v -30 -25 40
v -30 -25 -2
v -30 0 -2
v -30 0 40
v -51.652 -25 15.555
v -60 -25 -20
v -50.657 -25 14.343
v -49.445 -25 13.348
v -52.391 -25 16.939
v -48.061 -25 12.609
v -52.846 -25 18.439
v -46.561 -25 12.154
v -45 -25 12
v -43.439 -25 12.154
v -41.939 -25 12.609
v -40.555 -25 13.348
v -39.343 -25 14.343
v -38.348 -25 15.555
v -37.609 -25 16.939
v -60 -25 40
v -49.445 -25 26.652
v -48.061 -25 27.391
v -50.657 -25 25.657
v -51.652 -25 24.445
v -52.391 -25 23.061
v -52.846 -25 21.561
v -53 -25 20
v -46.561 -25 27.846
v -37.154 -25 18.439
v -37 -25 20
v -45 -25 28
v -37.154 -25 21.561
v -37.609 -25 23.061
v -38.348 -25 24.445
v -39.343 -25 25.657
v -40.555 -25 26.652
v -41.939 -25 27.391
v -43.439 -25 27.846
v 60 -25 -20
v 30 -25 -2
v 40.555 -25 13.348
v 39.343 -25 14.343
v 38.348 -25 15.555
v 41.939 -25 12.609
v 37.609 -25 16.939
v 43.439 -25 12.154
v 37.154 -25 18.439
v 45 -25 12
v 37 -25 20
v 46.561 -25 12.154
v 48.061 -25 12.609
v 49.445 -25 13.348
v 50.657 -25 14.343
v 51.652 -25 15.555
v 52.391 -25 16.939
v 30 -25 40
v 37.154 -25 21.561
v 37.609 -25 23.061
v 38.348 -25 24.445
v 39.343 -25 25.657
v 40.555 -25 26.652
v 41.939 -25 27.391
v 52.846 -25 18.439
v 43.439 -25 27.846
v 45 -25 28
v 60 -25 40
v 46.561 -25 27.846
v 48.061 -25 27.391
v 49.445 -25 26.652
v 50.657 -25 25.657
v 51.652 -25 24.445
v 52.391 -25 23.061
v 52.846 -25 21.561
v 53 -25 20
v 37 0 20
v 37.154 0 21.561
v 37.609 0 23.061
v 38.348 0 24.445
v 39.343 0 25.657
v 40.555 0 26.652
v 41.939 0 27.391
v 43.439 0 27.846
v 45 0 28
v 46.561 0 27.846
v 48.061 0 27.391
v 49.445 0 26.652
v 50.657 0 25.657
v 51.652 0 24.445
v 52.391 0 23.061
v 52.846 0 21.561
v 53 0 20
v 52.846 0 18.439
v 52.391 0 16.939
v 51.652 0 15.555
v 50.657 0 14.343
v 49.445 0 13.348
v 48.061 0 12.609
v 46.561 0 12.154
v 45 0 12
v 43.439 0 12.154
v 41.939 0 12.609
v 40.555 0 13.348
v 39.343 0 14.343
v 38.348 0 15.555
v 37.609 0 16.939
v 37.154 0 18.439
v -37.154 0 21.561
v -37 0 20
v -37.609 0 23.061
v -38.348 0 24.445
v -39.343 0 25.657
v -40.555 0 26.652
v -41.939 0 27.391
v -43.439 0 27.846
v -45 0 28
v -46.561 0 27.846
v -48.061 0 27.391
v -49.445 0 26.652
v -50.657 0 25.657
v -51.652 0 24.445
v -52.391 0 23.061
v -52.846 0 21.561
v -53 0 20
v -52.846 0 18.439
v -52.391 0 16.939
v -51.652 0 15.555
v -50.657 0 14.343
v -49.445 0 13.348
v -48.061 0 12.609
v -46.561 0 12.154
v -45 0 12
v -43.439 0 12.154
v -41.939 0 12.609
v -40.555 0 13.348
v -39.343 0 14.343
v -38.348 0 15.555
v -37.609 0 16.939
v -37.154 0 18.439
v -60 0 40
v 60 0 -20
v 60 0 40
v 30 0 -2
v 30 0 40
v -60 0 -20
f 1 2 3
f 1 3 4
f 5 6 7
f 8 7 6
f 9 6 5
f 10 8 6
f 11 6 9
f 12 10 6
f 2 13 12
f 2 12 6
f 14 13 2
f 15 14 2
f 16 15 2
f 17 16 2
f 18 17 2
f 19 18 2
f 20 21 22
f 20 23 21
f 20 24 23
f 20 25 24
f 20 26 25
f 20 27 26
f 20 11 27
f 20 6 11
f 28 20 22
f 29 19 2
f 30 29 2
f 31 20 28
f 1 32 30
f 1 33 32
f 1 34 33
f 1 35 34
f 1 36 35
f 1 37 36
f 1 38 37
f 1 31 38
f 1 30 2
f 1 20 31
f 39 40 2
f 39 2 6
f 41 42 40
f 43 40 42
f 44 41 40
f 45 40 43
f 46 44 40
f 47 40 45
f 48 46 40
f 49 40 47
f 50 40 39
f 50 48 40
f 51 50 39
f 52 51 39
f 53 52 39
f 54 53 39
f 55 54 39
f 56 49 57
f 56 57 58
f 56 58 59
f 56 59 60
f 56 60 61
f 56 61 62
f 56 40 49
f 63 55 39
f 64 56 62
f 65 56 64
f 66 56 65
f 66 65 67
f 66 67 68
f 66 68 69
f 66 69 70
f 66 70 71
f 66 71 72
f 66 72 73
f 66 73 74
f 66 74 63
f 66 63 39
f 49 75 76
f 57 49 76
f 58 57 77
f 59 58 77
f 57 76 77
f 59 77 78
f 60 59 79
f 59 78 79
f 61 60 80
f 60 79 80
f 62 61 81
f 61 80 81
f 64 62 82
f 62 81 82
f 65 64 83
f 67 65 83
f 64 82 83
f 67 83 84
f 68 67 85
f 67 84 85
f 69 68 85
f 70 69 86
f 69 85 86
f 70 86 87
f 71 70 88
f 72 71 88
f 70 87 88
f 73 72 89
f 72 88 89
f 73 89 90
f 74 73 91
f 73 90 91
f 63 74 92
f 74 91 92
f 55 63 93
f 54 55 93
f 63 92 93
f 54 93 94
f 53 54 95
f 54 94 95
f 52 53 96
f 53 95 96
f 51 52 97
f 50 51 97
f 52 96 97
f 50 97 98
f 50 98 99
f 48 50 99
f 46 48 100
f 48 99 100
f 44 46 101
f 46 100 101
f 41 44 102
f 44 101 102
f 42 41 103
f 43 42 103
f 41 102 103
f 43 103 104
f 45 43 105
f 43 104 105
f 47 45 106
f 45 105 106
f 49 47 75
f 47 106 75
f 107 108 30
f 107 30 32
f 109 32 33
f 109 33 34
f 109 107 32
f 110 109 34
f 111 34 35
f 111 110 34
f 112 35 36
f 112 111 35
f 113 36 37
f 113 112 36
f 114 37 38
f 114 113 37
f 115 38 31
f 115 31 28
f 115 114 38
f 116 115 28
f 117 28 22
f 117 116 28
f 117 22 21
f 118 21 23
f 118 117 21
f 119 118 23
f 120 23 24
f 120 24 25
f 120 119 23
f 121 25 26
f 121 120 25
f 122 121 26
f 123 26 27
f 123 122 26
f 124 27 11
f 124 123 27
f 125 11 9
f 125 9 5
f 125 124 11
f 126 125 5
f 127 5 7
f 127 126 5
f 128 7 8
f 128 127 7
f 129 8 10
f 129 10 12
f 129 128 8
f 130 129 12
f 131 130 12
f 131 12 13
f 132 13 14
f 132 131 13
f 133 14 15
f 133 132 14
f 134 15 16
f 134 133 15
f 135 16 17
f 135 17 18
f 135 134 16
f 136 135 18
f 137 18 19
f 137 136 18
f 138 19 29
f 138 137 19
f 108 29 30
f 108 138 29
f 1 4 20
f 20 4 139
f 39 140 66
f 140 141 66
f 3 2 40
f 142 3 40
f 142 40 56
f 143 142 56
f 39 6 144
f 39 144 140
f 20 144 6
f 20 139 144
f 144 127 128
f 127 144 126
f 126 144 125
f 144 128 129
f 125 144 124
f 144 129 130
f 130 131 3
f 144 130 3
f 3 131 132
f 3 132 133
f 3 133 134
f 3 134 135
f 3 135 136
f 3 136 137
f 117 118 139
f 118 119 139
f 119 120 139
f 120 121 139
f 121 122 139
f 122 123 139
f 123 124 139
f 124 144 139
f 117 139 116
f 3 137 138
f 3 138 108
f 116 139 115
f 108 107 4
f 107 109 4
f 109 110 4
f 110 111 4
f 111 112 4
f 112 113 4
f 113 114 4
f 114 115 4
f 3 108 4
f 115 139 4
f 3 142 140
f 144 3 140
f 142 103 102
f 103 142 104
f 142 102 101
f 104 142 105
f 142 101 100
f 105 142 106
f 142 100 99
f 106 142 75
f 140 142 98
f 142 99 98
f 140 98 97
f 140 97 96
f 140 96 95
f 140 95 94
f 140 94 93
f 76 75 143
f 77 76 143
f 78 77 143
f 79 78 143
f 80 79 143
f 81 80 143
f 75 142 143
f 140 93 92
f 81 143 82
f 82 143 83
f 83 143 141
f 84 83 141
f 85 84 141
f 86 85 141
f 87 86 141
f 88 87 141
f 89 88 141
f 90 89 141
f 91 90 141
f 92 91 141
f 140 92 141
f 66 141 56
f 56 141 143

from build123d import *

# Parameters (mm, degrees)
F0_W      = 60
F0_H      = 40
F0_R      = 8
F1_DEPTH  = 25
F2_FACE_W = 120
F2_FACE_H = 25
F3_DEPTH  = 20
F4_W      = 60
F4_H      = 42
F5_DEPTH  = 25.001


with BuildPart() as f1:
    # F0 (on Front) → F1 (new body)
    with BuildSketch(Plane.XZ):
        with Locations((-30, 20)):
            Rectangle(F0_W, F0_H)
        with Locations((-45, 20)):
            Circle(F0_R, mode=Mode.SUBTRACT)
    extrude(amount=F1_DEPTH)

    # F2: F1 across face


with BuildPart() as f1_1:
    add(f1.part)
    add(f1.part.mirror(Plane(origin=(0, -12.5, 20), x_dir=(0, 1, 0), z_dir=(1, 0, 0))))

    # F2_face (on face) → F3 (join)
    with BuildSketch(Plane(origin=(0, -12.5, 0), x_dir=(1, 0, 0), z_dir=(0, 0, -1))):
        Rectangle(F2_FACE_W, F2_FACE_H)
    extrude(amount=F3_DEPTH)

    # F4 (on face) → F5 (cut, through all)
    with BuildSketch(Plane.XZ.offset(25)):
        with Locations((0, 19)):
            Rectangle(F4_W, F4_H)
    extrude(amount=-F5_DEPTH, mode=Mode.SUBTRACT)


solid = f1_1.part
